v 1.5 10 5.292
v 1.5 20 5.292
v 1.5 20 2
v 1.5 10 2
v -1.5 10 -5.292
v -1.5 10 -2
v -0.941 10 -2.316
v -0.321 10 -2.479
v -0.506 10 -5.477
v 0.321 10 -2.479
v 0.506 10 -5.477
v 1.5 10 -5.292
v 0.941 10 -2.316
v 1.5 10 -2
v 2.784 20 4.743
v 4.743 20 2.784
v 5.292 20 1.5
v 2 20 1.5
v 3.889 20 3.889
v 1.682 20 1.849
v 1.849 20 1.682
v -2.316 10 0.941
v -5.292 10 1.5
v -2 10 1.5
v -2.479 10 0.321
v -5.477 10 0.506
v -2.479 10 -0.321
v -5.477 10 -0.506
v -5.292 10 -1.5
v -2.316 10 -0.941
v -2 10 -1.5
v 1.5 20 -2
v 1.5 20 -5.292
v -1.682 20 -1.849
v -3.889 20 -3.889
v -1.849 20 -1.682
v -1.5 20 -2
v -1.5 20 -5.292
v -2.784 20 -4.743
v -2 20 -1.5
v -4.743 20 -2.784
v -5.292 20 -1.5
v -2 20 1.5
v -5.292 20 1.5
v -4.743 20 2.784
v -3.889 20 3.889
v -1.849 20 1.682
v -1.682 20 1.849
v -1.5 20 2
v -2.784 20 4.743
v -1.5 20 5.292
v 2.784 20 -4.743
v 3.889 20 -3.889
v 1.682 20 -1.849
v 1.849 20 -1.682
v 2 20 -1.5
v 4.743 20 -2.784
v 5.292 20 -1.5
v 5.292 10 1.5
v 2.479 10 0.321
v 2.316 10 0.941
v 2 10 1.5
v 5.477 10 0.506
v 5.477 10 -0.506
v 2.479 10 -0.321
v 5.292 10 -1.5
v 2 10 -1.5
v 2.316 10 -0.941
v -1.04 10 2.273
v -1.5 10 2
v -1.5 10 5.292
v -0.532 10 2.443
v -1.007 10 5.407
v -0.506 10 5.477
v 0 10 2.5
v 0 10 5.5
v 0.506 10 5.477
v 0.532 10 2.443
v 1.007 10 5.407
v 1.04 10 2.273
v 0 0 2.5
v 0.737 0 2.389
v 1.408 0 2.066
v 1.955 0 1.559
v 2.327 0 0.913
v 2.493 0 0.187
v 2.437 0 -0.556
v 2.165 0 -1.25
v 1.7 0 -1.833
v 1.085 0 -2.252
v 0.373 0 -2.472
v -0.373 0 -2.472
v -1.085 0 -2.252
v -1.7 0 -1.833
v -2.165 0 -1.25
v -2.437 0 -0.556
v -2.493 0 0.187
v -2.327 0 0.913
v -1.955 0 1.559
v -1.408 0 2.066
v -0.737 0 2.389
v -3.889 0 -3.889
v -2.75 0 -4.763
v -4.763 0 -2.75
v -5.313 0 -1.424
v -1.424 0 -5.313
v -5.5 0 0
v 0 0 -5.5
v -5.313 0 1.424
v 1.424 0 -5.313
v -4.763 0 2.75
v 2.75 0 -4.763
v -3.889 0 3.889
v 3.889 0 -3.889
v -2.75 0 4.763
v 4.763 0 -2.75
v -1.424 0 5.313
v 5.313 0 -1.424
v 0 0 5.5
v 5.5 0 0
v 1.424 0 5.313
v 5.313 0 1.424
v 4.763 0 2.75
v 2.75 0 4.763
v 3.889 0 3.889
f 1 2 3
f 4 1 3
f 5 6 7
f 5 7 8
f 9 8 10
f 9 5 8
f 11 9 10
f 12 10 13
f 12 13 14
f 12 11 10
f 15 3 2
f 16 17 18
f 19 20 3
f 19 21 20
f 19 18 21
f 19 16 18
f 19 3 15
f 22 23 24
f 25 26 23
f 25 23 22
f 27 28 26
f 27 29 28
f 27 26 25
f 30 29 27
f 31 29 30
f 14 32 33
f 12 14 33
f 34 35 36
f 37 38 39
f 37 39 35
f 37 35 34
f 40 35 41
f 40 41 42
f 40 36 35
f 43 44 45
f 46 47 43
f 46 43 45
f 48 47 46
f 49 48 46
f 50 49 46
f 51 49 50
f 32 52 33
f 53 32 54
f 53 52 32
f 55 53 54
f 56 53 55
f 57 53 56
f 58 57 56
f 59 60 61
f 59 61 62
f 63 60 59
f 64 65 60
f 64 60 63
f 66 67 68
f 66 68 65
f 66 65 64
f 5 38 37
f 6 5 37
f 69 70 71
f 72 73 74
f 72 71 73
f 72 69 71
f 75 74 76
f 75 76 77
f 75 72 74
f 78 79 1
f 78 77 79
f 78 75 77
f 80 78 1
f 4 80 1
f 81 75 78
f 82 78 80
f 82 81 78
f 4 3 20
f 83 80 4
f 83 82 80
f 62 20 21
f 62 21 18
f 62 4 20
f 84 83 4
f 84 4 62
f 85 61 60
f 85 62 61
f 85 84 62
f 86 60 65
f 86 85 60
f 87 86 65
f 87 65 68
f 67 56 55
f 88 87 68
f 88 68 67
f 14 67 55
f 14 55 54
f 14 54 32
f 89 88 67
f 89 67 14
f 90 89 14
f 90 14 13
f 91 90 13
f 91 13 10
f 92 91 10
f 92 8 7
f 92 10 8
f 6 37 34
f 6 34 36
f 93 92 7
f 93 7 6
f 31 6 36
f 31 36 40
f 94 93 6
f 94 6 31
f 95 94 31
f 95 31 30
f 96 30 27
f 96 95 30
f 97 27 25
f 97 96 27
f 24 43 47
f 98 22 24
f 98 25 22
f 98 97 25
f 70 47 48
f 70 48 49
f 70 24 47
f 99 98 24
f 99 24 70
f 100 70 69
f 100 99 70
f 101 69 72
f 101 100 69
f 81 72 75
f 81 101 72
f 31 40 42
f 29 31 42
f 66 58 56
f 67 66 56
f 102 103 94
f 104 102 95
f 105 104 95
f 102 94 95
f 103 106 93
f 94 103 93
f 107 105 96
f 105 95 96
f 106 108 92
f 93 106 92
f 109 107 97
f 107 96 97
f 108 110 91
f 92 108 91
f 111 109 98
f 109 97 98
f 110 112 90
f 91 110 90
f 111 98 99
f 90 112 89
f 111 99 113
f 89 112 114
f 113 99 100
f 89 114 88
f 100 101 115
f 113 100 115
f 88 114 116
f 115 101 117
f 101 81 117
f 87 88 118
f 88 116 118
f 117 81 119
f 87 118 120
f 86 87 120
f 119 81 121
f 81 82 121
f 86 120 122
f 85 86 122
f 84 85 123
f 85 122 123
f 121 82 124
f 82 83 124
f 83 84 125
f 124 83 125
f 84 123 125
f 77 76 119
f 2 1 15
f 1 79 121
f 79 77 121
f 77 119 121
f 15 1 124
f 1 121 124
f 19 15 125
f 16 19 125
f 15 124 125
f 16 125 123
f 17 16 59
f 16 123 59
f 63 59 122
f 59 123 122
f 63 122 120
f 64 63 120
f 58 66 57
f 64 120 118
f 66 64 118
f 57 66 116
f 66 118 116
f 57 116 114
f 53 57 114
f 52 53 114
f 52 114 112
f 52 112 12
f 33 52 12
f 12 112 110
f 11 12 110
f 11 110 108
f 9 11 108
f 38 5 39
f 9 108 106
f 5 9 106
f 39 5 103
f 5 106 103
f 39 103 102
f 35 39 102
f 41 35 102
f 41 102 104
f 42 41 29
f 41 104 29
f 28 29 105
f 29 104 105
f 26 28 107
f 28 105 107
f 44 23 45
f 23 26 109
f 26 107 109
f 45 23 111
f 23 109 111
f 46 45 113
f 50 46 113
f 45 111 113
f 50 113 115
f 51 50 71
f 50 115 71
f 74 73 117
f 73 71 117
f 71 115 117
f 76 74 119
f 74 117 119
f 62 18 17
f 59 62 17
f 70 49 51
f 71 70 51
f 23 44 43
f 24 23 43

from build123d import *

# Parameters (mm, degrees)
ESQUISSE1_R             = 5.5
ESQUISSE1_R_2           = 2.5
BOSS_EXTRU_1_DEPTH      = 20
ENL_V_MAT_EXTRU_1_DEPTH = 10


with BuildPart() as part:
    # Esquisse1 → Boss.-Extru.1 (new body)
    with BuildSketch(Plane(origin=(0, 0, 0), x_dir=(1, 0, 0), z_dir=(0, 1, 0))):
        with Locations(Location((0, 0, 0), (0, 0, 270))):
            Circle(ESQUISSE1_R)
        with Locations(Location((0, 0, 0), (0, 0, 270))):
            Circle(ESQUISSE1_R_2, mode=Mode.SUBTRACT)
    extrude(amount=BOSS_EXTRU_1_DEPTH)

    # Esquisse2 → Enlèv. mat.-Extru.1 (cut)
    with BuildSketch(Plane(origin=(0, 20, 0), x_dir=(1, 0, 0), z_dir=(0, 1, 0))):
        Polygon((-1.5, 5.80668977), (-1.5, 1.5), (-8.808638821, 1.5), (-9.18844746, -1.5), (-1.5, -1.5), (-1.5, -5.792081745), (1.5, -5.792081745), (1.5, -1.5), (7.78364435, -1.5), (7.981313964, 1.5), (1.5, 1.5), (1.5, 5.80668977), align=None)
    extrude(amount=-ENL_V_MAT_EXTRU_1_DEPTH, mode=Mode.SUBTRACT)


solid = part.part
